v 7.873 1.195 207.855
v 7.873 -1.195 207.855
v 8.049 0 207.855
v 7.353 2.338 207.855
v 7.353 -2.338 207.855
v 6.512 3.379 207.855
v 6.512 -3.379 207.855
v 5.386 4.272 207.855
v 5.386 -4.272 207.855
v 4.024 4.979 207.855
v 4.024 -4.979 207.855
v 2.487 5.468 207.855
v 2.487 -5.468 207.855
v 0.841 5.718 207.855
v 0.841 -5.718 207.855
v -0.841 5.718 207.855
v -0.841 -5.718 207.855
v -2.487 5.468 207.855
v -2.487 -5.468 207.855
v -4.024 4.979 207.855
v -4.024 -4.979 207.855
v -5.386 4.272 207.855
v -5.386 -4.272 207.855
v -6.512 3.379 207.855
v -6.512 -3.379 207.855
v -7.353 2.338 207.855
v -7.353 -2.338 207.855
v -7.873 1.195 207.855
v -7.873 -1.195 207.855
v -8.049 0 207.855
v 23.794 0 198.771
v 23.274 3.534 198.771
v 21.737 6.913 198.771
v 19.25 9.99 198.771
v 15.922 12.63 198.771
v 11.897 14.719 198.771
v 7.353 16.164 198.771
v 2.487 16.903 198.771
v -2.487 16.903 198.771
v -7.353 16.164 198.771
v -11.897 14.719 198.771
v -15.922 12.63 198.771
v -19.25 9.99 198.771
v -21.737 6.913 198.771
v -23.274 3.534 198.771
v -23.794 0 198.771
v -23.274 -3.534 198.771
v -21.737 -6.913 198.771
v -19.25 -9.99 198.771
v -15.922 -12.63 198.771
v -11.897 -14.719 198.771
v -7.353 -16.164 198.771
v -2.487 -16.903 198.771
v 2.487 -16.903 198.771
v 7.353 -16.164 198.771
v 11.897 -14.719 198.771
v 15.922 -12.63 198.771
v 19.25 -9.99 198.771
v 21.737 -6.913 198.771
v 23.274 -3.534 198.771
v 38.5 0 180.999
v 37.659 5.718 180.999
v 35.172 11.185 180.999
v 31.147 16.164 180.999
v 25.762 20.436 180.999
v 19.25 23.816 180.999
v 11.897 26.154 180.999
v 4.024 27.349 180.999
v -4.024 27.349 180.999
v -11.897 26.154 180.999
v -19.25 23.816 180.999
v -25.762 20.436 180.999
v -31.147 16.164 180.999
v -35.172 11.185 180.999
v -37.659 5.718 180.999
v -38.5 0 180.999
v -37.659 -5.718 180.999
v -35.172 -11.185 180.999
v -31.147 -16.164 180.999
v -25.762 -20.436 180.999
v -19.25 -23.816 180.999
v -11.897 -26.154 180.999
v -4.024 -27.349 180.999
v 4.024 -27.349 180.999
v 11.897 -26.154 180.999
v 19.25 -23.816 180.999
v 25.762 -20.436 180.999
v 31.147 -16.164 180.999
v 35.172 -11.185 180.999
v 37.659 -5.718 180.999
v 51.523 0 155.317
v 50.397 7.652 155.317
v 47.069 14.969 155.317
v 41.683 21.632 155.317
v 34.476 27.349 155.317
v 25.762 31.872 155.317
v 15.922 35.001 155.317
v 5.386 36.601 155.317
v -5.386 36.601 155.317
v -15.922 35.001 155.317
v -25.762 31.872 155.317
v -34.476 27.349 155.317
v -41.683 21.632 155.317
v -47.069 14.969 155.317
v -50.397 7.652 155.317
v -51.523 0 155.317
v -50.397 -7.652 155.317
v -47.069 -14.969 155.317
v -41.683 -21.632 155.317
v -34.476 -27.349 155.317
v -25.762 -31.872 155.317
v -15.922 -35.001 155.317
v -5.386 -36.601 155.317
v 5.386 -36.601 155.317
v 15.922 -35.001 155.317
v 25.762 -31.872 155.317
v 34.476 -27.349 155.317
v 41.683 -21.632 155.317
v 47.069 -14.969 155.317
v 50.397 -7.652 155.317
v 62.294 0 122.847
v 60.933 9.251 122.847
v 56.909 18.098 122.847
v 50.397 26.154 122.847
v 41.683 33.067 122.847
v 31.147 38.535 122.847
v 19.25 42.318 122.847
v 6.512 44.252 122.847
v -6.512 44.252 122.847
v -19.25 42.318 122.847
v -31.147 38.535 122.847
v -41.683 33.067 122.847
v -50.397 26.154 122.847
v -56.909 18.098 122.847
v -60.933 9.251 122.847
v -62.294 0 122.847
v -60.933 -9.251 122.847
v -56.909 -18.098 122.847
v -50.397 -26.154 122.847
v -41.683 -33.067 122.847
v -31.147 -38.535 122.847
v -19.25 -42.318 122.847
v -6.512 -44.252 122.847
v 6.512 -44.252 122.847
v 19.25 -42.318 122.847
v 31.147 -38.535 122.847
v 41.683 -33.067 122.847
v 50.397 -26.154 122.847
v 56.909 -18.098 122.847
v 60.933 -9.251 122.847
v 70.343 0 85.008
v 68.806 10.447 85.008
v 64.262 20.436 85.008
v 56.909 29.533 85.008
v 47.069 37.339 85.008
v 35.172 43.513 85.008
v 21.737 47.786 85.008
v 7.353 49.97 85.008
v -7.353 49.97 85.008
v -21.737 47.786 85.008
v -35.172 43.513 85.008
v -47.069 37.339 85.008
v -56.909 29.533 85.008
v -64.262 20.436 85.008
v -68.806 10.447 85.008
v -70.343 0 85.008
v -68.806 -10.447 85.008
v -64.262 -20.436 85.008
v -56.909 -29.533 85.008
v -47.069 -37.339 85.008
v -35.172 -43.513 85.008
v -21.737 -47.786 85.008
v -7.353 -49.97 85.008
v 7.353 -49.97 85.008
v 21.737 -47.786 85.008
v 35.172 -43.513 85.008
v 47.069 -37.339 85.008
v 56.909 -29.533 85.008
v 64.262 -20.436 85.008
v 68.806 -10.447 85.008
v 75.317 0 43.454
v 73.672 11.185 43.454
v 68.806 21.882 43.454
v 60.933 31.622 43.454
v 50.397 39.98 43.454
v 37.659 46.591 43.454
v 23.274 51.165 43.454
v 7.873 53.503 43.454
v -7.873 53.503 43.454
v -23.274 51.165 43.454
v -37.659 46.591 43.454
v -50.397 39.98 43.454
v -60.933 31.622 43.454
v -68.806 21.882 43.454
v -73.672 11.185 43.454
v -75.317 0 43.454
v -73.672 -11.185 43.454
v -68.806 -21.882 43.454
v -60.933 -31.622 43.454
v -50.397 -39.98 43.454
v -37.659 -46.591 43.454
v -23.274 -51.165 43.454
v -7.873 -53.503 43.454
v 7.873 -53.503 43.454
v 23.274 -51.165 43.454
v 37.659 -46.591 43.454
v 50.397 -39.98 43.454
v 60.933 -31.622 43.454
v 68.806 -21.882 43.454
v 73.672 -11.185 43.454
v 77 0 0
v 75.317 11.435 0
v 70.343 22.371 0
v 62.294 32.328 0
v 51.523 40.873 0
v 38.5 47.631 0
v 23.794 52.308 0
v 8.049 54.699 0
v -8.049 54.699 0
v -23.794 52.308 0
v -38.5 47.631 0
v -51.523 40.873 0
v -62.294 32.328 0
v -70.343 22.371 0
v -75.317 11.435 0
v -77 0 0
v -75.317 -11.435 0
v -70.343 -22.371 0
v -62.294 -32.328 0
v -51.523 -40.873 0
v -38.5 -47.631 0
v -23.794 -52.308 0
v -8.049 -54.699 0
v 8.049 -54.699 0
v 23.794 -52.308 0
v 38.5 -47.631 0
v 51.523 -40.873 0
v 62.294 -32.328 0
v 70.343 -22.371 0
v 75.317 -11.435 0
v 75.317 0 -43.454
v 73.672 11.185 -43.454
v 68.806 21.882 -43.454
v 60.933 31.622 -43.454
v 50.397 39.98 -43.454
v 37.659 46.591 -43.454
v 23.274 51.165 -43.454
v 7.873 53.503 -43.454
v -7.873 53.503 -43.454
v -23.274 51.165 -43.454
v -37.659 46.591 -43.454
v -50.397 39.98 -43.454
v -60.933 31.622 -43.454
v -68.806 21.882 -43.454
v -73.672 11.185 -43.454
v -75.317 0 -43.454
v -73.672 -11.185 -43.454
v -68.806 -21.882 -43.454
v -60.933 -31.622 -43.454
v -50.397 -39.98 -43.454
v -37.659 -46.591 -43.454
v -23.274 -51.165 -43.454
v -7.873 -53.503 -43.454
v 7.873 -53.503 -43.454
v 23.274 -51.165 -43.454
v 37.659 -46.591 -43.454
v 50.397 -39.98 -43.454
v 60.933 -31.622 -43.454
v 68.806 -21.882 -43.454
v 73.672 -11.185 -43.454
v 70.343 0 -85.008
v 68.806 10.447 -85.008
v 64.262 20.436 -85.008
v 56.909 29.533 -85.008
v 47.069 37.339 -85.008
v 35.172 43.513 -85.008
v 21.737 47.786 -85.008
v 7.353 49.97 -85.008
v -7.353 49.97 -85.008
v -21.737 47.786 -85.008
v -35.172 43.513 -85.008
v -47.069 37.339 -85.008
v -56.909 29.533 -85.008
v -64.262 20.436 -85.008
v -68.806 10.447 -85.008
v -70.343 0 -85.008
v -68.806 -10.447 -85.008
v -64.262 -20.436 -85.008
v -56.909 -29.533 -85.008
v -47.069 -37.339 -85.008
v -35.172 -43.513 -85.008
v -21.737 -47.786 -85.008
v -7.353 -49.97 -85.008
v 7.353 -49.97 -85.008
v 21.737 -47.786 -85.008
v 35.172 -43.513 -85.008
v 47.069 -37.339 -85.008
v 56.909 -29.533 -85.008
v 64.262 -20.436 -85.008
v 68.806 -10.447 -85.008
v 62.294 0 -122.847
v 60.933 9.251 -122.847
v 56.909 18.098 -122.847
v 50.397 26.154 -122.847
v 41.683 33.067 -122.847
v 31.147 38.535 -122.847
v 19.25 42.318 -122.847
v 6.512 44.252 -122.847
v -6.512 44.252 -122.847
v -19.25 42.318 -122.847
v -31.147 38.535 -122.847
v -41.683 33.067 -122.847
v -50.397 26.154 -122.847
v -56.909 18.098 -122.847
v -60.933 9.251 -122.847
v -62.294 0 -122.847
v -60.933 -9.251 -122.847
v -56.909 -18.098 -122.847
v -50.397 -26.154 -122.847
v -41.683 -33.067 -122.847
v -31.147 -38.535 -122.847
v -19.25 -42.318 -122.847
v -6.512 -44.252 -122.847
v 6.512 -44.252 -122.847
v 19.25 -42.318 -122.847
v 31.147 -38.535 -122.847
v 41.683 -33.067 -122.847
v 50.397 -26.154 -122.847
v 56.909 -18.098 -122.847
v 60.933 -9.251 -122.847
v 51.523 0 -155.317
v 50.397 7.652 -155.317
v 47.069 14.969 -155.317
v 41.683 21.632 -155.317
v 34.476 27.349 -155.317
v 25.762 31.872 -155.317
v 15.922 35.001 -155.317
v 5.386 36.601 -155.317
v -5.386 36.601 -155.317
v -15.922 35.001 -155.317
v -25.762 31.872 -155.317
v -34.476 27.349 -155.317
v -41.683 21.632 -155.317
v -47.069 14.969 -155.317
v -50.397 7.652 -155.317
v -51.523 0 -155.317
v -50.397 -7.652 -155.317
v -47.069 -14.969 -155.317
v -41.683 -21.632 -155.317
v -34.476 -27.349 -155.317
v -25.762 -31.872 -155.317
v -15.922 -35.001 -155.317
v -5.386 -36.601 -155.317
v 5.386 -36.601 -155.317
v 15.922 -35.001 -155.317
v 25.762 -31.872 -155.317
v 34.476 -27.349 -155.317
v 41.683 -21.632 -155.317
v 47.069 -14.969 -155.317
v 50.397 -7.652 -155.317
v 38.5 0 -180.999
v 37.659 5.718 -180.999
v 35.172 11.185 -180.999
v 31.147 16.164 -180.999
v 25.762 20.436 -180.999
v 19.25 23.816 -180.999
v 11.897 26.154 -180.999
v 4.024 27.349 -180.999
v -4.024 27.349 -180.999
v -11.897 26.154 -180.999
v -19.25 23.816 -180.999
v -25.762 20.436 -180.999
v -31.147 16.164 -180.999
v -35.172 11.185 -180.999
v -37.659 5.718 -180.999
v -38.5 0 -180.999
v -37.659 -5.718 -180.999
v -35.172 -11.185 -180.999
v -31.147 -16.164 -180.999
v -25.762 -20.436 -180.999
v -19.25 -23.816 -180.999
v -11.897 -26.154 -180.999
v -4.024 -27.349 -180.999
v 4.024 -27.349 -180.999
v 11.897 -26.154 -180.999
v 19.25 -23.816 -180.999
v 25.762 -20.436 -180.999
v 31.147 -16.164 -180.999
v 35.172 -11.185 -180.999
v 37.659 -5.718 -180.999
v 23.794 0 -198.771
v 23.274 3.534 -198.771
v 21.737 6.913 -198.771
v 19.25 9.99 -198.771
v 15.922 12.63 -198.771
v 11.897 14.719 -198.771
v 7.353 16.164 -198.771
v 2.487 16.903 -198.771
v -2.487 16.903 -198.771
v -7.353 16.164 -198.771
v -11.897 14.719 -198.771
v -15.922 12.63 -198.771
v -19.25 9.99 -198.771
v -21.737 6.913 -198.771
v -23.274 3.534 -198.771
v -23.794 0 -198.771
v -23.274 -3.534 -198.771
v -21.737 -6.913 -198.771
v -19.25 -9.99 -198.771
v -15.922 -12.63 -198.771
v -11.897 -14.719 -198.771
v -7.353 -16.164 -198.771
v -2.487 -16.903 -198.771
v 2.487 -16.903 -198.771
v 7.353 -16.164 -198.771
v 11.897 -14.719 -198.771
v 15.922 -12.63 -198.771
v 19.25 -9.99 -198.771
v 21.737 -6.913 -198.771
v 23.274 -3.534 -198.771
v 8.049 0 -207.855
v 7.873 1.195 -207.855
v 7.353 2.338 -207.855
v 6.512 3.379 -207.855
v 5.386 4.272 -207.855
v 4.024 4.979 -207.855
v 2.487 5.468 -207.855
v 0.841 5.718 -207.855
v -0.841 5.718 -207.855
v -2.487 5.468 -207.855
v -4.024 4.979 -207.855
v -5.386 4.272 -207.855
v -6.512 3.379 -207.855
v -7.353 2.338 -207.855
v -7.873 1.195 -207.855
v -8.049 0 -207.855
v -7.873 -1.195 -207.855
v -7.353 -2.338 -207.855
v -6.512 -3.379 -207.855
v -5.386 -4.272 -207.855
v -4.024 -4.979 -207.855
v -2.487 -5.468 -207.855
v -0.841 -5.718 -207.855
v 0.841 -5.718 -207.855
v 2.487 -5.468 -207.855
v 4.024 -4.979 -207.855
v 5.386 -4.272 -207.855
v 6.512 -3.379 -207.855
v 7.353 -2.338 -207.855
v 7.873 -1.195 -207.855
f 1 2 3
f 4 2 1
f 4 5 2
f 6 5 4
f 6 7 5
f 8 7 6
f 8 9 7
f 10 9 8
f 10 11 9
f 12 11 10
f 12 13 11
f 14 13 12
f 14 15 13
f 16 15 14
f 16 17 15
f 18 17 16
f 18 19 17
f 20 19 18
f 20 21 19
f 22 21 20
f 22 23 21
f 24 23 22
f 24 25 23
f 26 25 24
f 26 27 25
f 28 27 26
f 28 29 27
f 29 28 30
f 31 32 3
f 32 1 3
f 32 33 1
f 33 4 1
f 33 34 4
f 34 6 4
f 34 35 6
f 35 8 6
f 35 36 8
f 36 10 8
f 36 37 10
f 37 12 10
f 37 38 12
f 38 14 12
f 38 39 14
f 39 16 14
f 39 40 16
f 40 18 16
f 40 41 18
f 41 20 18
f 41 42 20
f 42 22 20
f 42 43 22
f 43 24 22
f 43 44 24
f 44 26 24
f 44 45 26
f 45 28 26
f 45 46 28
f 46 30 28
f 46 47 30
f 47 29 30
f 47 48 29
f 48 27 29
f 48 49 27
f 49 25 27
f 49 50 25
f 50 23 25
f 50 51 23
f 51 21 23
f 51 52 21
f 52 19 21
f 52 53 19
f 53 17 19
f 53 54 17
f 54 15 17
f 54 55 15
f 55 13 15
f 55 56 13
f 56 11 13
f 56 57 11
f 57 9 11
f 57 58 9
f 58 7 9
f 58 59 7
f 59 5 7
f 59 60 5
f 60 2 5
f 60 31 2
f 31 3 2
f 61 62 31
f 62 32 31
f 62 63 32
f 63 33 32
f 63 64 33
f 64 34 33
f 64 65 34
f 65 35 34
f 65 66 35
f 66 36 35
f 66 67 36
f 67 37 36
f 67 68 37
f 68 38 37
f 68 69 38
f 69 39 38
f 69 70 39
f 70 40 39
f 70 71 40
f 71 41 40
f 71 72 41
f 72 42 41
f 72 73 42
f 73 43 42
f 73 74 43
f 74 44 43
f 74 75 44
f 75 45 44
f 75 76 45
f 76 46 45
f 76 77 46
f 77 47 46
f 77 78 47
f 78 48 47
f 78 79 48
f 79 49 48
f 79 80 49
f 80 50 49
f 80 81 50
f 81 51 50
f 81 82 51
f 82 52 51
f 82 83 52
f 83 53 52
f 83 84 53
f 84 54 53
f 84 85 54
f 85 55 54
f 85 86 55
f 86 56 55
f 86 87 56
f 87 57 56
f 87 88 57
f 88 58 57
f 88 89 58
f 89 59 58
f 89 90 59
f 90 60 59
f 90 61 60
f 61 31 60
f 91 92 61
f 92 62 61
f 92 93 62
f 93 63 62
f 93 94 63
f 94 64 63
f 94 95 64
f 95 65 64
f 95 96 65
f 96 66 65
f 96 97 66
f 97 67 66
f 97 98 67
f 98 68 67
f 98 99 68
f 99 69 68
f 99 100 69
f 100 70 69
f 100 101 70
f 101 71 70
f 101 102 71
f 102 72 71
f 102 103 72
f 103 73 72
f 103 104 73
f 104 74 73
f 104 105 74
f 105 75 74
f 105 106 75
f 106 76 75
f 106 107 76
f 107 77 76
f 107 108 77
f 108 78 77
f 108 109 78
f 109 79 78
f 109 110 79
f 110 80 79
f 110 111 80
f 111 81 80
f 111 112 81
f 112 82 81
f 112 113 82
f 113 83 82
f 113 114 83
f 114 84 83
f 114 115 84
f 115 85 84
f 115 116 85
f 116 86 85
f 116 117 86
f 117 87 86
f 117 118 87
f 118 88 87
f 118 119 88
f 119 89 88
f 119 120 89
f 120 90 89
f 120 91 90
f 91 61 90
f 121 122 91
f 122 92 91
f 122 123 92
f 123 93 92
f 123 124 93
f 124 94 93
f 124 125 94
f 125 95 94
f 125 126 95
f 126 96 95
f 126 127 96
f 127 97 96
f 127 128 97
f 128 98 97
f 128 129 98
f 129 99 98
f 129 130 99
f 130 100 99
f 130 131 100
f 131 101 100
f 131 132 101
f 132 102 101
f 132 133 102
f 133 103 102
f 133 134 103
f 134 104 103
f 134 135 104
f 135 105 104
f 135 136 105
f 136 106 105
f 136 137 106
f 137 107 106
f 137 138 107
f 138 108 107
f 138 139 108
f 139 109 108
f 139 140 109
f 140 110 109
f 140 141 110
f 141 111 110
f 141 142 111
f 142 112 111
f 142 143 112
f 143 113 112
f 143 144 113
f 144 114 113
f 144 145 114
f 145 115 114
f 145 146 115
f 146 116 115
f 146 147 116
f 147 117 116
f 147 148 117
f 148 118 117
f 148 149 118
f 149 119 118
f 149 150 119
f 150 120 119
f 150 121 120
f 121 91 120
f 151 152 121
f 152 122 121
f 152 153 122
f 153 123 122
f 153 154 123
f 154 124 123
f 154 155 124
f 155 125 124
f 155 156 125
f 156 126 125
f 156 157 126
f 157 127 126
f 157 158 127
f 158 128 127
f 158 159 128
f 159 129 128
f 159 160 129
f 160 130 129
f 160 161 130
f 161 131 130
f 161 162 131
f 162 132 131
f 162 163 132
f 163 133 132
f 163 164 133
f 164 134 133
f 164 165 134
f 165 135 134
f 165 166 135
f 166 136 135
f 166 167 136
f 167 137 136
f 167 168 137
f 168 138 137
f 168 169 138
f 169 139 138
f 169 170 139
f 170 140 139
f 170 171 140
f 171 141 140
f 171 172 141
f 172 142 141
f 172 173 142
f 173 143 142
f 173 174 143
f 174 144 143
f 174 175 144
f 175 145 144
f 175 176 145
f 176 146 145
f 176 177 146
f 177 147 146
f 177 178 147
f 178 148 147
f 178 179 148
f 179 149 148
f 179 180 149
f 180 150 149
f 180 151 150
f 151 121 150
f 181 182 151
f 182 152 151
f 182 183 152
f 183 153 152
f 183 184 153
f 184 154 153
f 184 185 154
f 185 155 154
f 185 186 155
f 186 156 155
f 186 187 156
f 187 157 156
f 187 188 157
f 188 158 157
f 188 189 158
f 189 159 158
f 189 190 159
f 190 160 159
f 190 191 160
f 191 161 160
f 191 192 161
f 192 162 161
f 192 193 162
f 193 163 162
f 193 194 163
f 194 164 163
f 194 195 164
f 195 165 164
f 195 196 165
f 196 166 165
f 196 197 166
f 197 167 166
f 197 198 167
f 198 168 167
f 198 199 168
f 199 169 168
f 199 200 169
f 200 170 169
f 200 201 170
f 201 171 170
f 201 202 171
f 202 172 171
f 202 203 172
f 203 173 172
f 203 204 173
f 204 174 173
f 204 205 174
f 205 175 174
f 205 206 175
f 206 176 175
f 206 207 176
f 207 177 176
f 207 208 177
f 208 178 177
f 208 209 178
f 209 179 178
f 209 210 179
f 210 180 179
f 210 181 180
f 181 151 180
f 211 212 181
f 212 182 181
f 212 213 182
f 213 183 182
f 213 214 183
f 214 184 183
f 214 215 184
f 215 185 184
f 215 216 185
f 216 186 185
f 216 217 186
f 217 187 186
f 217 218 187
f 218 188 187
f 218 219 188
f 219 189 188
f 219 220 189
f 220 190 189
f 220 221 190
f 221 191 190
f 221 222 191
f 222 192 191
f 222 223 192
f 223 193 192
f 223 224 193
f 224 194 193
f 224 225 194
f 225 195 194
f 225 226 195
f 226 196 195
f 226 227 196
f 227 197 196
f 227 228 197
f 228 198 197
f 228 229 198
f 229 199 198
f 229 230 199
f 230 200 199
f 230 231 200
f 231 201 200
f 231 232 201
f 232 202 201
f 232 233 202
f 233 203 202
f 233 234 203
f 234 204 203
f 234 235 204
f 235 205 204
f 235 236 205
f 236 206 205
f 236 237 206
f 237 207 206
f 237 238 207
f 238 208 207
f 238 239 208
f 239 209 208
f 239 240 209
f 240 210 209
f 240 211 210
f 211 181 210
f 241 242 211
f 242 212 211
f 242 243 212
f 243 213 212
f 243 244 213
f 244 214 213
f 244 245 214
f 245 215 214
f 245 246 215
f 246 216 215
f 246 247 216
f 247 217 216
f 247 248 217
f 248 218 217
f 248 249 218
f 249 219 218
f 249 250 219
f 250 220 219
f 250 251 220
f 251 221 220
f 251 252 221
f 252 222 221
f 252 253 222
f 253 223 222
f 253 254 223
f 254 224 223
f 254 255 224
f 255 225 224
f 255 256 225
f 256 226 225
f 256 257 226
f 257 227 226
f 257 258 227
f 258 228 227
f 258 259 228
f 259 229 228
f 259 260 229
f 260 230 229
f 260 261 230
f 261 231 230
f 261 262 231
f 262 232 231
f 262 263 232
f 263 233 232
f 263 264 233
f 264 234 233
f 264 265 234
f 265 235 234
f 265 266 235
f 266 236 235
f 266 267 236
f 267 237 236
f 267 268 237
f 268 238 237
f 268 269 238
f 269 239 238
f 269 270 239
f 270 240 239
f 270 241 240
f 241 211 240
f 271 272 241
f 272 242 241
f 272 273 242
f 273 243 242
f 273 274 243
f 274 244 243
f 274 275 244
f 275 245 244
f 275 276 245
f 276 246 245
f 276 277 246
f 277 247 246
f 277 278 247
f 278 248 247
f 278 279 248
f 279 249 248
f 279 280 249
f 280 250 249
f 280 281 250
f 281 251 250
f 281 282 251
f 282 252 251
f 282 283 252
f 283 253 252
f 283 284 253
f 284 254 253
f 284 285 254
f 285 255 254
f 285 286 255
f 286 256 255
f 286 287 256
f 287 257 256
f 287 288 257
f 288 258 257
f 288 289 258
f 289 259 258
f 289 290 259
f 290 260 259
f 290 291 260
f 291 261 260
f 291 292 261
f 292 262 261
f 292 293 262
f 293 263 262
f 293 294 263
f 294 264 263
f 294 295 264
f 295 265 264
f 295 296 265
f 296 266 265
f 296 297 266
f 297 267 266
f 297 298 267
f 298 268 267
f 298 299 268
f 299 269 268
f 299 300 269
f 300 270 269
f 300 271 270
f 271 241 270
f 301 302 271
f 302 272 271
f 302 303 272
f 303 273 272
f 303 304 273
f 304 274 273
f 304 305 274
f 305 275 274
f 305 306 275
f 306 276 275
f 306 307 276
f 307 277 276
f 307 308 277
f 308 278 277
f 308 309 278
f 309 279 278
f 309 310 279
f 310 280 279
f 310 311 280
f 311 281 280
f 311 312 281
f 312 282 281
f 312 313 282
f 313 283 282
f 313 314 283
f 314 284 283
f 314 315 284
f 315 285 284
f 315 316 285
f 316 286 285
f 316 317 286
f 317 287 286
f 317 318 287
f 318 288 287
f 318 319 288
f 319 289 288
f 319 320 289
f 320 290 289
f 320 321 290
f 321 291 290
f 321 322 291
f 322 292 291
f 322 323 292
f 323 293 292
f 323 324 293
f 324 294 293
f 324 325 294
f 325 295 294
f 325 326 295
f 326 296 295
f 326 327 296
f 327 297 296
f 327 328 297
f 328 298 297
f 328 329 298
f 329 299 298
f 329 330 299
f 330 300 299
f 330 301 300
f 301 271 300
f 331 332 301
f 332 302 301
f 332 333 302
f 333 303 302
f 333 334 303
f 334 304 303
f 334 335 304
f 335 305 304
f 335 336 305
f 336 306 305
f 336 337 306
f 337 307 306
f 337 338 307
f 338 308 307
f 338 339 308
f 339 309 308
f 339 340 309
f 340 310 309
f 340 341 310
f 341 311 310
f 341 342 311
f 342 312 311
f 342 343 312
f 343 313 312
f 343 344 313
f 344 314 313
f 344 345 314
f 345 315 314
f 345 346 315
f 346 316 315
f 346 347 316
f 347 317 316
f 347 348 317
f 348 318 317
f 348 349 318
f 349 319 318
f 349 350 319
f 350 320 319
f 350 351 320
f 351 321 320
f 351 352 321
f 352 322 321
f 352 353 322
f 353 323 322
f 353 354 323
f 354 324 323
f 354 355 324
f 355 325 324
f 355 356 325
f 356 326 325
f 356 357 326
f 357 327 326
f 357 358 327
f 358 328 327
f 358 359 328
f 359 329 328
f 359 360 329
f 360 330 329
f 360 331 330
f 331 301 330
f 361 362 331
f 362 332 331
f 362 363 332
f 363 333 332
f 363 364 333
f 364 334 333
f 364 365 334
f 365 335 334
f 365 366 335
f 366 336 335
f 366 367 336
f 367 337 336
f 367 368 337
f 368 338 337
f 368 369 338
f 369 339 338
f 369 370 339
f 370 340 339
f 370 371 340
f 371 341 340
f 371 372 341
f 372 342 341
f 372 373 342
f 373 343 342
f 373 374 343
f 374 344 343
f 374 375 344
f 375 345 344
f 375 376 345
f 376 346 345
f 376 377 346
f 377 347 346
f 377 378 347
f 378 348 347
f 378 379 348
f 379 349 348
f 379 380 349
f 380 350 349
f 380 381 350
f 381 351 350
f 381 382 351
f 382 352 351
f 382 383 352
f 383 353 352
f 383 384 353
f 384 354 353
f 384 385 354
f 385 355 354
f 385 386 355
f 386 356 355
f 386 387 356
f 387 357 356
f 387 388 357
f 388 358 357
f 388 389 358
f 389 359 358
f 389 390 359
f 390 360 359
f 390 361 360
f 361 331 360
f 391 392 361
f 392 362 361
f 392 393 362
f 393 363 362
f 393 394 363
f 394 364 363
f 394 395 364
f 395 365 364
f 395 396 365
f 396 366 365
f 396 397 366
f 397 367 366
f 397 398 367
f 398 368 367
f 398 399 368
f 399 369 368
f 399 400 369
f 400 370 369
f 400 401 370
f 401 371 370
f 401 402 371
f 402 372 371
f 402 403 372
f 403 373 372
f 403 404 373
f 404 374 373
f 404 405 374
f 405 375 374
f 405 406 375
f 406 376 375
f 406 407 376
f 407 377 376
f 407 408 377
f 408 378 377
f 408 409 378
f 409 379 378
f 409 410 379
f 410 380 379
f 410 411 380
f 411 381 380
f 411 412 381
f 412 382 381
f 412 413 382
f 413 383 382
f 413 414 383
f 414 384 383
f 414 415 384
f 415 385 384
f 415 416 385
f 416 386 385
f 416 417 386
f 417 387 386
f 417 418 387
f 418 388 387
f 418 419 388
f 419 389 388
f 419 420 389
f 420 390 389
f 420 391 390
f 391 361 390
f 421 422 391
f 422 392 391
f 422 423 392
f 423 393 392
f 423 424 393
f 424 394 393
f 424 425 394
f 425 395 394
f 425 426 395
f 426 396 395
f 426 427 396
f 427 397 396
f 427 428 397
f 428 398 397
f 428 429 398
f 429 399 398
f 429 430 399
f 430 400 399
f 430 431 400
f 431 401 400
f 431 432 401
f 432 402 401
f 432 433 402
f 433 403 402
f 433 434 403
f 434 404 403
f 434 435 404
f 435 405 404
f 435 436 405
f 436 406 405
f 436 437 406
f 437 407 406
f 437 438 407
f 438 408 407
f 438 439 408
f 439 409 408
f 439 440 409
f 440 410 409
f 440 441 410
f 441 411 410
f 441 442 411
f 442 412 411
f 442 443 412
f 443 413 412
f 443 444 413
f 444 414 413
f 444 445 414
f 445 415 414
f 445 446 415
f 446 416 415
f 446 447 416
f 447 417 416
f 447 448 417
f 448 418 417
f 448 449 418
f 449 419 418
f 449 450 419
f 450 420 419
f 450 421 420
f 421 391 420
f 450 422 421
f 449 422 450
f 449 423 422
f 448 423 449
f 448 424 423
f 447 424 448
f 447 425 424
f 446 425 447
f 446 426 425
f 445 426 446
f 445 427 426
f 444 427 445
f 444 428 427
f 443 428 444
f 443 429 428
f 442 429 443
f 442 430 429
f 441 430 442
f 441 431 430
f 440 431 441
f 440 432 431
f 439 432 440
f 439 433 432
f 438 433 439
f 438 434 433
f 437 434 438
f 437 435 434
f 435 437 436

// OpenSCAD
// Generated by SolidPython 1.0.1 on 2020-07-29 00:46:47


scale(v = [7, 5, 19]) {
	sphere(r = 11);
}
/***********************************************
*********      SolidPython code:      **********
************************************************
 
# import packages: SolidPython
from solid import *
from solid.utils import *
from itertools import chain, combinations, permutations


class Resize:

    def __init__(self, scad_file):
        self.scad_file = scad_file
        #self.scad_file = import_scad(scad_file)
        # cone/cylinder param:
        self.r1 = 0
        self.r2 = 0
        self.h = 0
        # rectangular prism param:
        self.w = 0
        self.l = 0
        # ellipse param:
        self.r = 0

    # import OpenScad code (file name corresponds to shape)


    # classify shape + parameters
    def assign(self, param1, param2, param3):
        if self.scad_file == 'cone.scad':
            self.r1 = param1
            self.r2 = param2
            self.h = param3
        elif self.scad_file == 'cylinder.scad':
            self.r1 = param1
            self.r2 = param2
            self.h = param3
        elif self.scad_file == 'rectangularPrism.scad':
            self.h = param1
            self.l = param2
            self.w = param3
        else:
            self.r = param1
            self.h = param2

    # resize parameters
    def iterate(self):
        x = range(3, 20, 2)
        i = 1
        if self.scad_file == 'cone.scad':
            tempList = list(permutations(x, 2))
            for temp in tempList:
                param1 = temp[0]
                param2 = temp[1]
                filepath = 'produced_scad_files/' + 'cone' + str(param1) + '_' + str(param2) + '_' + '.scad'
                scad_render_to_file(cylinder(h=param1, r1=param2, r2=0), filepath)

        elif self.scad_file == 'cylinder.scad':
            tempList = list(permutations(x, 3))
            for temp in tempList:
                param1 = temp[0]
                param2 = temp[1]
                filepath = 'produced_scad_files/' + 'cylinder' + str(param1) + '_' + str(param2) + '_' + '.scad'
                scad_render_to_file(cylinder(h=param1, r1=param2, r2=param2), filepath)

        elif self.scad_file == 'rectangularPrism.scad':
            tempList = list(permutations(x, 3))
            for temp in tempList:
                param1 = temp[0]
                param2 = temp[1]
                param3 = temp[2]
                filepath = 'produced_scad_files/' + 'rectangularPrism' + str(param1) + '_' + str(param2) + '_' + str(
                    param3) + '.scad'
                scad_render_to_file(cube(size=(param1, param2, param3)), filepath)

        elif self.scad_file == 'ellipse.scad':
            tempList = list(permutations(x, 4))
            for temp in tempList:
                param1 = temp[0]
                param2 = temp[1]
                param3 = temp[2]
                param4 = temp[3]
                filepath = 'produced_scad_files/' + 'ellipse' + str(param1) + '_' + str(param2) + '_' + str(param3) + '_' + str(param4) + '.scad'
                scad_render_to_file(scale([param1, param2, param3])(sphere(r=param4)), filepath)

    def render_to_scadfile(self):
        scad_render_to_file(scad, 'example.scad') 
 
************************************************/
